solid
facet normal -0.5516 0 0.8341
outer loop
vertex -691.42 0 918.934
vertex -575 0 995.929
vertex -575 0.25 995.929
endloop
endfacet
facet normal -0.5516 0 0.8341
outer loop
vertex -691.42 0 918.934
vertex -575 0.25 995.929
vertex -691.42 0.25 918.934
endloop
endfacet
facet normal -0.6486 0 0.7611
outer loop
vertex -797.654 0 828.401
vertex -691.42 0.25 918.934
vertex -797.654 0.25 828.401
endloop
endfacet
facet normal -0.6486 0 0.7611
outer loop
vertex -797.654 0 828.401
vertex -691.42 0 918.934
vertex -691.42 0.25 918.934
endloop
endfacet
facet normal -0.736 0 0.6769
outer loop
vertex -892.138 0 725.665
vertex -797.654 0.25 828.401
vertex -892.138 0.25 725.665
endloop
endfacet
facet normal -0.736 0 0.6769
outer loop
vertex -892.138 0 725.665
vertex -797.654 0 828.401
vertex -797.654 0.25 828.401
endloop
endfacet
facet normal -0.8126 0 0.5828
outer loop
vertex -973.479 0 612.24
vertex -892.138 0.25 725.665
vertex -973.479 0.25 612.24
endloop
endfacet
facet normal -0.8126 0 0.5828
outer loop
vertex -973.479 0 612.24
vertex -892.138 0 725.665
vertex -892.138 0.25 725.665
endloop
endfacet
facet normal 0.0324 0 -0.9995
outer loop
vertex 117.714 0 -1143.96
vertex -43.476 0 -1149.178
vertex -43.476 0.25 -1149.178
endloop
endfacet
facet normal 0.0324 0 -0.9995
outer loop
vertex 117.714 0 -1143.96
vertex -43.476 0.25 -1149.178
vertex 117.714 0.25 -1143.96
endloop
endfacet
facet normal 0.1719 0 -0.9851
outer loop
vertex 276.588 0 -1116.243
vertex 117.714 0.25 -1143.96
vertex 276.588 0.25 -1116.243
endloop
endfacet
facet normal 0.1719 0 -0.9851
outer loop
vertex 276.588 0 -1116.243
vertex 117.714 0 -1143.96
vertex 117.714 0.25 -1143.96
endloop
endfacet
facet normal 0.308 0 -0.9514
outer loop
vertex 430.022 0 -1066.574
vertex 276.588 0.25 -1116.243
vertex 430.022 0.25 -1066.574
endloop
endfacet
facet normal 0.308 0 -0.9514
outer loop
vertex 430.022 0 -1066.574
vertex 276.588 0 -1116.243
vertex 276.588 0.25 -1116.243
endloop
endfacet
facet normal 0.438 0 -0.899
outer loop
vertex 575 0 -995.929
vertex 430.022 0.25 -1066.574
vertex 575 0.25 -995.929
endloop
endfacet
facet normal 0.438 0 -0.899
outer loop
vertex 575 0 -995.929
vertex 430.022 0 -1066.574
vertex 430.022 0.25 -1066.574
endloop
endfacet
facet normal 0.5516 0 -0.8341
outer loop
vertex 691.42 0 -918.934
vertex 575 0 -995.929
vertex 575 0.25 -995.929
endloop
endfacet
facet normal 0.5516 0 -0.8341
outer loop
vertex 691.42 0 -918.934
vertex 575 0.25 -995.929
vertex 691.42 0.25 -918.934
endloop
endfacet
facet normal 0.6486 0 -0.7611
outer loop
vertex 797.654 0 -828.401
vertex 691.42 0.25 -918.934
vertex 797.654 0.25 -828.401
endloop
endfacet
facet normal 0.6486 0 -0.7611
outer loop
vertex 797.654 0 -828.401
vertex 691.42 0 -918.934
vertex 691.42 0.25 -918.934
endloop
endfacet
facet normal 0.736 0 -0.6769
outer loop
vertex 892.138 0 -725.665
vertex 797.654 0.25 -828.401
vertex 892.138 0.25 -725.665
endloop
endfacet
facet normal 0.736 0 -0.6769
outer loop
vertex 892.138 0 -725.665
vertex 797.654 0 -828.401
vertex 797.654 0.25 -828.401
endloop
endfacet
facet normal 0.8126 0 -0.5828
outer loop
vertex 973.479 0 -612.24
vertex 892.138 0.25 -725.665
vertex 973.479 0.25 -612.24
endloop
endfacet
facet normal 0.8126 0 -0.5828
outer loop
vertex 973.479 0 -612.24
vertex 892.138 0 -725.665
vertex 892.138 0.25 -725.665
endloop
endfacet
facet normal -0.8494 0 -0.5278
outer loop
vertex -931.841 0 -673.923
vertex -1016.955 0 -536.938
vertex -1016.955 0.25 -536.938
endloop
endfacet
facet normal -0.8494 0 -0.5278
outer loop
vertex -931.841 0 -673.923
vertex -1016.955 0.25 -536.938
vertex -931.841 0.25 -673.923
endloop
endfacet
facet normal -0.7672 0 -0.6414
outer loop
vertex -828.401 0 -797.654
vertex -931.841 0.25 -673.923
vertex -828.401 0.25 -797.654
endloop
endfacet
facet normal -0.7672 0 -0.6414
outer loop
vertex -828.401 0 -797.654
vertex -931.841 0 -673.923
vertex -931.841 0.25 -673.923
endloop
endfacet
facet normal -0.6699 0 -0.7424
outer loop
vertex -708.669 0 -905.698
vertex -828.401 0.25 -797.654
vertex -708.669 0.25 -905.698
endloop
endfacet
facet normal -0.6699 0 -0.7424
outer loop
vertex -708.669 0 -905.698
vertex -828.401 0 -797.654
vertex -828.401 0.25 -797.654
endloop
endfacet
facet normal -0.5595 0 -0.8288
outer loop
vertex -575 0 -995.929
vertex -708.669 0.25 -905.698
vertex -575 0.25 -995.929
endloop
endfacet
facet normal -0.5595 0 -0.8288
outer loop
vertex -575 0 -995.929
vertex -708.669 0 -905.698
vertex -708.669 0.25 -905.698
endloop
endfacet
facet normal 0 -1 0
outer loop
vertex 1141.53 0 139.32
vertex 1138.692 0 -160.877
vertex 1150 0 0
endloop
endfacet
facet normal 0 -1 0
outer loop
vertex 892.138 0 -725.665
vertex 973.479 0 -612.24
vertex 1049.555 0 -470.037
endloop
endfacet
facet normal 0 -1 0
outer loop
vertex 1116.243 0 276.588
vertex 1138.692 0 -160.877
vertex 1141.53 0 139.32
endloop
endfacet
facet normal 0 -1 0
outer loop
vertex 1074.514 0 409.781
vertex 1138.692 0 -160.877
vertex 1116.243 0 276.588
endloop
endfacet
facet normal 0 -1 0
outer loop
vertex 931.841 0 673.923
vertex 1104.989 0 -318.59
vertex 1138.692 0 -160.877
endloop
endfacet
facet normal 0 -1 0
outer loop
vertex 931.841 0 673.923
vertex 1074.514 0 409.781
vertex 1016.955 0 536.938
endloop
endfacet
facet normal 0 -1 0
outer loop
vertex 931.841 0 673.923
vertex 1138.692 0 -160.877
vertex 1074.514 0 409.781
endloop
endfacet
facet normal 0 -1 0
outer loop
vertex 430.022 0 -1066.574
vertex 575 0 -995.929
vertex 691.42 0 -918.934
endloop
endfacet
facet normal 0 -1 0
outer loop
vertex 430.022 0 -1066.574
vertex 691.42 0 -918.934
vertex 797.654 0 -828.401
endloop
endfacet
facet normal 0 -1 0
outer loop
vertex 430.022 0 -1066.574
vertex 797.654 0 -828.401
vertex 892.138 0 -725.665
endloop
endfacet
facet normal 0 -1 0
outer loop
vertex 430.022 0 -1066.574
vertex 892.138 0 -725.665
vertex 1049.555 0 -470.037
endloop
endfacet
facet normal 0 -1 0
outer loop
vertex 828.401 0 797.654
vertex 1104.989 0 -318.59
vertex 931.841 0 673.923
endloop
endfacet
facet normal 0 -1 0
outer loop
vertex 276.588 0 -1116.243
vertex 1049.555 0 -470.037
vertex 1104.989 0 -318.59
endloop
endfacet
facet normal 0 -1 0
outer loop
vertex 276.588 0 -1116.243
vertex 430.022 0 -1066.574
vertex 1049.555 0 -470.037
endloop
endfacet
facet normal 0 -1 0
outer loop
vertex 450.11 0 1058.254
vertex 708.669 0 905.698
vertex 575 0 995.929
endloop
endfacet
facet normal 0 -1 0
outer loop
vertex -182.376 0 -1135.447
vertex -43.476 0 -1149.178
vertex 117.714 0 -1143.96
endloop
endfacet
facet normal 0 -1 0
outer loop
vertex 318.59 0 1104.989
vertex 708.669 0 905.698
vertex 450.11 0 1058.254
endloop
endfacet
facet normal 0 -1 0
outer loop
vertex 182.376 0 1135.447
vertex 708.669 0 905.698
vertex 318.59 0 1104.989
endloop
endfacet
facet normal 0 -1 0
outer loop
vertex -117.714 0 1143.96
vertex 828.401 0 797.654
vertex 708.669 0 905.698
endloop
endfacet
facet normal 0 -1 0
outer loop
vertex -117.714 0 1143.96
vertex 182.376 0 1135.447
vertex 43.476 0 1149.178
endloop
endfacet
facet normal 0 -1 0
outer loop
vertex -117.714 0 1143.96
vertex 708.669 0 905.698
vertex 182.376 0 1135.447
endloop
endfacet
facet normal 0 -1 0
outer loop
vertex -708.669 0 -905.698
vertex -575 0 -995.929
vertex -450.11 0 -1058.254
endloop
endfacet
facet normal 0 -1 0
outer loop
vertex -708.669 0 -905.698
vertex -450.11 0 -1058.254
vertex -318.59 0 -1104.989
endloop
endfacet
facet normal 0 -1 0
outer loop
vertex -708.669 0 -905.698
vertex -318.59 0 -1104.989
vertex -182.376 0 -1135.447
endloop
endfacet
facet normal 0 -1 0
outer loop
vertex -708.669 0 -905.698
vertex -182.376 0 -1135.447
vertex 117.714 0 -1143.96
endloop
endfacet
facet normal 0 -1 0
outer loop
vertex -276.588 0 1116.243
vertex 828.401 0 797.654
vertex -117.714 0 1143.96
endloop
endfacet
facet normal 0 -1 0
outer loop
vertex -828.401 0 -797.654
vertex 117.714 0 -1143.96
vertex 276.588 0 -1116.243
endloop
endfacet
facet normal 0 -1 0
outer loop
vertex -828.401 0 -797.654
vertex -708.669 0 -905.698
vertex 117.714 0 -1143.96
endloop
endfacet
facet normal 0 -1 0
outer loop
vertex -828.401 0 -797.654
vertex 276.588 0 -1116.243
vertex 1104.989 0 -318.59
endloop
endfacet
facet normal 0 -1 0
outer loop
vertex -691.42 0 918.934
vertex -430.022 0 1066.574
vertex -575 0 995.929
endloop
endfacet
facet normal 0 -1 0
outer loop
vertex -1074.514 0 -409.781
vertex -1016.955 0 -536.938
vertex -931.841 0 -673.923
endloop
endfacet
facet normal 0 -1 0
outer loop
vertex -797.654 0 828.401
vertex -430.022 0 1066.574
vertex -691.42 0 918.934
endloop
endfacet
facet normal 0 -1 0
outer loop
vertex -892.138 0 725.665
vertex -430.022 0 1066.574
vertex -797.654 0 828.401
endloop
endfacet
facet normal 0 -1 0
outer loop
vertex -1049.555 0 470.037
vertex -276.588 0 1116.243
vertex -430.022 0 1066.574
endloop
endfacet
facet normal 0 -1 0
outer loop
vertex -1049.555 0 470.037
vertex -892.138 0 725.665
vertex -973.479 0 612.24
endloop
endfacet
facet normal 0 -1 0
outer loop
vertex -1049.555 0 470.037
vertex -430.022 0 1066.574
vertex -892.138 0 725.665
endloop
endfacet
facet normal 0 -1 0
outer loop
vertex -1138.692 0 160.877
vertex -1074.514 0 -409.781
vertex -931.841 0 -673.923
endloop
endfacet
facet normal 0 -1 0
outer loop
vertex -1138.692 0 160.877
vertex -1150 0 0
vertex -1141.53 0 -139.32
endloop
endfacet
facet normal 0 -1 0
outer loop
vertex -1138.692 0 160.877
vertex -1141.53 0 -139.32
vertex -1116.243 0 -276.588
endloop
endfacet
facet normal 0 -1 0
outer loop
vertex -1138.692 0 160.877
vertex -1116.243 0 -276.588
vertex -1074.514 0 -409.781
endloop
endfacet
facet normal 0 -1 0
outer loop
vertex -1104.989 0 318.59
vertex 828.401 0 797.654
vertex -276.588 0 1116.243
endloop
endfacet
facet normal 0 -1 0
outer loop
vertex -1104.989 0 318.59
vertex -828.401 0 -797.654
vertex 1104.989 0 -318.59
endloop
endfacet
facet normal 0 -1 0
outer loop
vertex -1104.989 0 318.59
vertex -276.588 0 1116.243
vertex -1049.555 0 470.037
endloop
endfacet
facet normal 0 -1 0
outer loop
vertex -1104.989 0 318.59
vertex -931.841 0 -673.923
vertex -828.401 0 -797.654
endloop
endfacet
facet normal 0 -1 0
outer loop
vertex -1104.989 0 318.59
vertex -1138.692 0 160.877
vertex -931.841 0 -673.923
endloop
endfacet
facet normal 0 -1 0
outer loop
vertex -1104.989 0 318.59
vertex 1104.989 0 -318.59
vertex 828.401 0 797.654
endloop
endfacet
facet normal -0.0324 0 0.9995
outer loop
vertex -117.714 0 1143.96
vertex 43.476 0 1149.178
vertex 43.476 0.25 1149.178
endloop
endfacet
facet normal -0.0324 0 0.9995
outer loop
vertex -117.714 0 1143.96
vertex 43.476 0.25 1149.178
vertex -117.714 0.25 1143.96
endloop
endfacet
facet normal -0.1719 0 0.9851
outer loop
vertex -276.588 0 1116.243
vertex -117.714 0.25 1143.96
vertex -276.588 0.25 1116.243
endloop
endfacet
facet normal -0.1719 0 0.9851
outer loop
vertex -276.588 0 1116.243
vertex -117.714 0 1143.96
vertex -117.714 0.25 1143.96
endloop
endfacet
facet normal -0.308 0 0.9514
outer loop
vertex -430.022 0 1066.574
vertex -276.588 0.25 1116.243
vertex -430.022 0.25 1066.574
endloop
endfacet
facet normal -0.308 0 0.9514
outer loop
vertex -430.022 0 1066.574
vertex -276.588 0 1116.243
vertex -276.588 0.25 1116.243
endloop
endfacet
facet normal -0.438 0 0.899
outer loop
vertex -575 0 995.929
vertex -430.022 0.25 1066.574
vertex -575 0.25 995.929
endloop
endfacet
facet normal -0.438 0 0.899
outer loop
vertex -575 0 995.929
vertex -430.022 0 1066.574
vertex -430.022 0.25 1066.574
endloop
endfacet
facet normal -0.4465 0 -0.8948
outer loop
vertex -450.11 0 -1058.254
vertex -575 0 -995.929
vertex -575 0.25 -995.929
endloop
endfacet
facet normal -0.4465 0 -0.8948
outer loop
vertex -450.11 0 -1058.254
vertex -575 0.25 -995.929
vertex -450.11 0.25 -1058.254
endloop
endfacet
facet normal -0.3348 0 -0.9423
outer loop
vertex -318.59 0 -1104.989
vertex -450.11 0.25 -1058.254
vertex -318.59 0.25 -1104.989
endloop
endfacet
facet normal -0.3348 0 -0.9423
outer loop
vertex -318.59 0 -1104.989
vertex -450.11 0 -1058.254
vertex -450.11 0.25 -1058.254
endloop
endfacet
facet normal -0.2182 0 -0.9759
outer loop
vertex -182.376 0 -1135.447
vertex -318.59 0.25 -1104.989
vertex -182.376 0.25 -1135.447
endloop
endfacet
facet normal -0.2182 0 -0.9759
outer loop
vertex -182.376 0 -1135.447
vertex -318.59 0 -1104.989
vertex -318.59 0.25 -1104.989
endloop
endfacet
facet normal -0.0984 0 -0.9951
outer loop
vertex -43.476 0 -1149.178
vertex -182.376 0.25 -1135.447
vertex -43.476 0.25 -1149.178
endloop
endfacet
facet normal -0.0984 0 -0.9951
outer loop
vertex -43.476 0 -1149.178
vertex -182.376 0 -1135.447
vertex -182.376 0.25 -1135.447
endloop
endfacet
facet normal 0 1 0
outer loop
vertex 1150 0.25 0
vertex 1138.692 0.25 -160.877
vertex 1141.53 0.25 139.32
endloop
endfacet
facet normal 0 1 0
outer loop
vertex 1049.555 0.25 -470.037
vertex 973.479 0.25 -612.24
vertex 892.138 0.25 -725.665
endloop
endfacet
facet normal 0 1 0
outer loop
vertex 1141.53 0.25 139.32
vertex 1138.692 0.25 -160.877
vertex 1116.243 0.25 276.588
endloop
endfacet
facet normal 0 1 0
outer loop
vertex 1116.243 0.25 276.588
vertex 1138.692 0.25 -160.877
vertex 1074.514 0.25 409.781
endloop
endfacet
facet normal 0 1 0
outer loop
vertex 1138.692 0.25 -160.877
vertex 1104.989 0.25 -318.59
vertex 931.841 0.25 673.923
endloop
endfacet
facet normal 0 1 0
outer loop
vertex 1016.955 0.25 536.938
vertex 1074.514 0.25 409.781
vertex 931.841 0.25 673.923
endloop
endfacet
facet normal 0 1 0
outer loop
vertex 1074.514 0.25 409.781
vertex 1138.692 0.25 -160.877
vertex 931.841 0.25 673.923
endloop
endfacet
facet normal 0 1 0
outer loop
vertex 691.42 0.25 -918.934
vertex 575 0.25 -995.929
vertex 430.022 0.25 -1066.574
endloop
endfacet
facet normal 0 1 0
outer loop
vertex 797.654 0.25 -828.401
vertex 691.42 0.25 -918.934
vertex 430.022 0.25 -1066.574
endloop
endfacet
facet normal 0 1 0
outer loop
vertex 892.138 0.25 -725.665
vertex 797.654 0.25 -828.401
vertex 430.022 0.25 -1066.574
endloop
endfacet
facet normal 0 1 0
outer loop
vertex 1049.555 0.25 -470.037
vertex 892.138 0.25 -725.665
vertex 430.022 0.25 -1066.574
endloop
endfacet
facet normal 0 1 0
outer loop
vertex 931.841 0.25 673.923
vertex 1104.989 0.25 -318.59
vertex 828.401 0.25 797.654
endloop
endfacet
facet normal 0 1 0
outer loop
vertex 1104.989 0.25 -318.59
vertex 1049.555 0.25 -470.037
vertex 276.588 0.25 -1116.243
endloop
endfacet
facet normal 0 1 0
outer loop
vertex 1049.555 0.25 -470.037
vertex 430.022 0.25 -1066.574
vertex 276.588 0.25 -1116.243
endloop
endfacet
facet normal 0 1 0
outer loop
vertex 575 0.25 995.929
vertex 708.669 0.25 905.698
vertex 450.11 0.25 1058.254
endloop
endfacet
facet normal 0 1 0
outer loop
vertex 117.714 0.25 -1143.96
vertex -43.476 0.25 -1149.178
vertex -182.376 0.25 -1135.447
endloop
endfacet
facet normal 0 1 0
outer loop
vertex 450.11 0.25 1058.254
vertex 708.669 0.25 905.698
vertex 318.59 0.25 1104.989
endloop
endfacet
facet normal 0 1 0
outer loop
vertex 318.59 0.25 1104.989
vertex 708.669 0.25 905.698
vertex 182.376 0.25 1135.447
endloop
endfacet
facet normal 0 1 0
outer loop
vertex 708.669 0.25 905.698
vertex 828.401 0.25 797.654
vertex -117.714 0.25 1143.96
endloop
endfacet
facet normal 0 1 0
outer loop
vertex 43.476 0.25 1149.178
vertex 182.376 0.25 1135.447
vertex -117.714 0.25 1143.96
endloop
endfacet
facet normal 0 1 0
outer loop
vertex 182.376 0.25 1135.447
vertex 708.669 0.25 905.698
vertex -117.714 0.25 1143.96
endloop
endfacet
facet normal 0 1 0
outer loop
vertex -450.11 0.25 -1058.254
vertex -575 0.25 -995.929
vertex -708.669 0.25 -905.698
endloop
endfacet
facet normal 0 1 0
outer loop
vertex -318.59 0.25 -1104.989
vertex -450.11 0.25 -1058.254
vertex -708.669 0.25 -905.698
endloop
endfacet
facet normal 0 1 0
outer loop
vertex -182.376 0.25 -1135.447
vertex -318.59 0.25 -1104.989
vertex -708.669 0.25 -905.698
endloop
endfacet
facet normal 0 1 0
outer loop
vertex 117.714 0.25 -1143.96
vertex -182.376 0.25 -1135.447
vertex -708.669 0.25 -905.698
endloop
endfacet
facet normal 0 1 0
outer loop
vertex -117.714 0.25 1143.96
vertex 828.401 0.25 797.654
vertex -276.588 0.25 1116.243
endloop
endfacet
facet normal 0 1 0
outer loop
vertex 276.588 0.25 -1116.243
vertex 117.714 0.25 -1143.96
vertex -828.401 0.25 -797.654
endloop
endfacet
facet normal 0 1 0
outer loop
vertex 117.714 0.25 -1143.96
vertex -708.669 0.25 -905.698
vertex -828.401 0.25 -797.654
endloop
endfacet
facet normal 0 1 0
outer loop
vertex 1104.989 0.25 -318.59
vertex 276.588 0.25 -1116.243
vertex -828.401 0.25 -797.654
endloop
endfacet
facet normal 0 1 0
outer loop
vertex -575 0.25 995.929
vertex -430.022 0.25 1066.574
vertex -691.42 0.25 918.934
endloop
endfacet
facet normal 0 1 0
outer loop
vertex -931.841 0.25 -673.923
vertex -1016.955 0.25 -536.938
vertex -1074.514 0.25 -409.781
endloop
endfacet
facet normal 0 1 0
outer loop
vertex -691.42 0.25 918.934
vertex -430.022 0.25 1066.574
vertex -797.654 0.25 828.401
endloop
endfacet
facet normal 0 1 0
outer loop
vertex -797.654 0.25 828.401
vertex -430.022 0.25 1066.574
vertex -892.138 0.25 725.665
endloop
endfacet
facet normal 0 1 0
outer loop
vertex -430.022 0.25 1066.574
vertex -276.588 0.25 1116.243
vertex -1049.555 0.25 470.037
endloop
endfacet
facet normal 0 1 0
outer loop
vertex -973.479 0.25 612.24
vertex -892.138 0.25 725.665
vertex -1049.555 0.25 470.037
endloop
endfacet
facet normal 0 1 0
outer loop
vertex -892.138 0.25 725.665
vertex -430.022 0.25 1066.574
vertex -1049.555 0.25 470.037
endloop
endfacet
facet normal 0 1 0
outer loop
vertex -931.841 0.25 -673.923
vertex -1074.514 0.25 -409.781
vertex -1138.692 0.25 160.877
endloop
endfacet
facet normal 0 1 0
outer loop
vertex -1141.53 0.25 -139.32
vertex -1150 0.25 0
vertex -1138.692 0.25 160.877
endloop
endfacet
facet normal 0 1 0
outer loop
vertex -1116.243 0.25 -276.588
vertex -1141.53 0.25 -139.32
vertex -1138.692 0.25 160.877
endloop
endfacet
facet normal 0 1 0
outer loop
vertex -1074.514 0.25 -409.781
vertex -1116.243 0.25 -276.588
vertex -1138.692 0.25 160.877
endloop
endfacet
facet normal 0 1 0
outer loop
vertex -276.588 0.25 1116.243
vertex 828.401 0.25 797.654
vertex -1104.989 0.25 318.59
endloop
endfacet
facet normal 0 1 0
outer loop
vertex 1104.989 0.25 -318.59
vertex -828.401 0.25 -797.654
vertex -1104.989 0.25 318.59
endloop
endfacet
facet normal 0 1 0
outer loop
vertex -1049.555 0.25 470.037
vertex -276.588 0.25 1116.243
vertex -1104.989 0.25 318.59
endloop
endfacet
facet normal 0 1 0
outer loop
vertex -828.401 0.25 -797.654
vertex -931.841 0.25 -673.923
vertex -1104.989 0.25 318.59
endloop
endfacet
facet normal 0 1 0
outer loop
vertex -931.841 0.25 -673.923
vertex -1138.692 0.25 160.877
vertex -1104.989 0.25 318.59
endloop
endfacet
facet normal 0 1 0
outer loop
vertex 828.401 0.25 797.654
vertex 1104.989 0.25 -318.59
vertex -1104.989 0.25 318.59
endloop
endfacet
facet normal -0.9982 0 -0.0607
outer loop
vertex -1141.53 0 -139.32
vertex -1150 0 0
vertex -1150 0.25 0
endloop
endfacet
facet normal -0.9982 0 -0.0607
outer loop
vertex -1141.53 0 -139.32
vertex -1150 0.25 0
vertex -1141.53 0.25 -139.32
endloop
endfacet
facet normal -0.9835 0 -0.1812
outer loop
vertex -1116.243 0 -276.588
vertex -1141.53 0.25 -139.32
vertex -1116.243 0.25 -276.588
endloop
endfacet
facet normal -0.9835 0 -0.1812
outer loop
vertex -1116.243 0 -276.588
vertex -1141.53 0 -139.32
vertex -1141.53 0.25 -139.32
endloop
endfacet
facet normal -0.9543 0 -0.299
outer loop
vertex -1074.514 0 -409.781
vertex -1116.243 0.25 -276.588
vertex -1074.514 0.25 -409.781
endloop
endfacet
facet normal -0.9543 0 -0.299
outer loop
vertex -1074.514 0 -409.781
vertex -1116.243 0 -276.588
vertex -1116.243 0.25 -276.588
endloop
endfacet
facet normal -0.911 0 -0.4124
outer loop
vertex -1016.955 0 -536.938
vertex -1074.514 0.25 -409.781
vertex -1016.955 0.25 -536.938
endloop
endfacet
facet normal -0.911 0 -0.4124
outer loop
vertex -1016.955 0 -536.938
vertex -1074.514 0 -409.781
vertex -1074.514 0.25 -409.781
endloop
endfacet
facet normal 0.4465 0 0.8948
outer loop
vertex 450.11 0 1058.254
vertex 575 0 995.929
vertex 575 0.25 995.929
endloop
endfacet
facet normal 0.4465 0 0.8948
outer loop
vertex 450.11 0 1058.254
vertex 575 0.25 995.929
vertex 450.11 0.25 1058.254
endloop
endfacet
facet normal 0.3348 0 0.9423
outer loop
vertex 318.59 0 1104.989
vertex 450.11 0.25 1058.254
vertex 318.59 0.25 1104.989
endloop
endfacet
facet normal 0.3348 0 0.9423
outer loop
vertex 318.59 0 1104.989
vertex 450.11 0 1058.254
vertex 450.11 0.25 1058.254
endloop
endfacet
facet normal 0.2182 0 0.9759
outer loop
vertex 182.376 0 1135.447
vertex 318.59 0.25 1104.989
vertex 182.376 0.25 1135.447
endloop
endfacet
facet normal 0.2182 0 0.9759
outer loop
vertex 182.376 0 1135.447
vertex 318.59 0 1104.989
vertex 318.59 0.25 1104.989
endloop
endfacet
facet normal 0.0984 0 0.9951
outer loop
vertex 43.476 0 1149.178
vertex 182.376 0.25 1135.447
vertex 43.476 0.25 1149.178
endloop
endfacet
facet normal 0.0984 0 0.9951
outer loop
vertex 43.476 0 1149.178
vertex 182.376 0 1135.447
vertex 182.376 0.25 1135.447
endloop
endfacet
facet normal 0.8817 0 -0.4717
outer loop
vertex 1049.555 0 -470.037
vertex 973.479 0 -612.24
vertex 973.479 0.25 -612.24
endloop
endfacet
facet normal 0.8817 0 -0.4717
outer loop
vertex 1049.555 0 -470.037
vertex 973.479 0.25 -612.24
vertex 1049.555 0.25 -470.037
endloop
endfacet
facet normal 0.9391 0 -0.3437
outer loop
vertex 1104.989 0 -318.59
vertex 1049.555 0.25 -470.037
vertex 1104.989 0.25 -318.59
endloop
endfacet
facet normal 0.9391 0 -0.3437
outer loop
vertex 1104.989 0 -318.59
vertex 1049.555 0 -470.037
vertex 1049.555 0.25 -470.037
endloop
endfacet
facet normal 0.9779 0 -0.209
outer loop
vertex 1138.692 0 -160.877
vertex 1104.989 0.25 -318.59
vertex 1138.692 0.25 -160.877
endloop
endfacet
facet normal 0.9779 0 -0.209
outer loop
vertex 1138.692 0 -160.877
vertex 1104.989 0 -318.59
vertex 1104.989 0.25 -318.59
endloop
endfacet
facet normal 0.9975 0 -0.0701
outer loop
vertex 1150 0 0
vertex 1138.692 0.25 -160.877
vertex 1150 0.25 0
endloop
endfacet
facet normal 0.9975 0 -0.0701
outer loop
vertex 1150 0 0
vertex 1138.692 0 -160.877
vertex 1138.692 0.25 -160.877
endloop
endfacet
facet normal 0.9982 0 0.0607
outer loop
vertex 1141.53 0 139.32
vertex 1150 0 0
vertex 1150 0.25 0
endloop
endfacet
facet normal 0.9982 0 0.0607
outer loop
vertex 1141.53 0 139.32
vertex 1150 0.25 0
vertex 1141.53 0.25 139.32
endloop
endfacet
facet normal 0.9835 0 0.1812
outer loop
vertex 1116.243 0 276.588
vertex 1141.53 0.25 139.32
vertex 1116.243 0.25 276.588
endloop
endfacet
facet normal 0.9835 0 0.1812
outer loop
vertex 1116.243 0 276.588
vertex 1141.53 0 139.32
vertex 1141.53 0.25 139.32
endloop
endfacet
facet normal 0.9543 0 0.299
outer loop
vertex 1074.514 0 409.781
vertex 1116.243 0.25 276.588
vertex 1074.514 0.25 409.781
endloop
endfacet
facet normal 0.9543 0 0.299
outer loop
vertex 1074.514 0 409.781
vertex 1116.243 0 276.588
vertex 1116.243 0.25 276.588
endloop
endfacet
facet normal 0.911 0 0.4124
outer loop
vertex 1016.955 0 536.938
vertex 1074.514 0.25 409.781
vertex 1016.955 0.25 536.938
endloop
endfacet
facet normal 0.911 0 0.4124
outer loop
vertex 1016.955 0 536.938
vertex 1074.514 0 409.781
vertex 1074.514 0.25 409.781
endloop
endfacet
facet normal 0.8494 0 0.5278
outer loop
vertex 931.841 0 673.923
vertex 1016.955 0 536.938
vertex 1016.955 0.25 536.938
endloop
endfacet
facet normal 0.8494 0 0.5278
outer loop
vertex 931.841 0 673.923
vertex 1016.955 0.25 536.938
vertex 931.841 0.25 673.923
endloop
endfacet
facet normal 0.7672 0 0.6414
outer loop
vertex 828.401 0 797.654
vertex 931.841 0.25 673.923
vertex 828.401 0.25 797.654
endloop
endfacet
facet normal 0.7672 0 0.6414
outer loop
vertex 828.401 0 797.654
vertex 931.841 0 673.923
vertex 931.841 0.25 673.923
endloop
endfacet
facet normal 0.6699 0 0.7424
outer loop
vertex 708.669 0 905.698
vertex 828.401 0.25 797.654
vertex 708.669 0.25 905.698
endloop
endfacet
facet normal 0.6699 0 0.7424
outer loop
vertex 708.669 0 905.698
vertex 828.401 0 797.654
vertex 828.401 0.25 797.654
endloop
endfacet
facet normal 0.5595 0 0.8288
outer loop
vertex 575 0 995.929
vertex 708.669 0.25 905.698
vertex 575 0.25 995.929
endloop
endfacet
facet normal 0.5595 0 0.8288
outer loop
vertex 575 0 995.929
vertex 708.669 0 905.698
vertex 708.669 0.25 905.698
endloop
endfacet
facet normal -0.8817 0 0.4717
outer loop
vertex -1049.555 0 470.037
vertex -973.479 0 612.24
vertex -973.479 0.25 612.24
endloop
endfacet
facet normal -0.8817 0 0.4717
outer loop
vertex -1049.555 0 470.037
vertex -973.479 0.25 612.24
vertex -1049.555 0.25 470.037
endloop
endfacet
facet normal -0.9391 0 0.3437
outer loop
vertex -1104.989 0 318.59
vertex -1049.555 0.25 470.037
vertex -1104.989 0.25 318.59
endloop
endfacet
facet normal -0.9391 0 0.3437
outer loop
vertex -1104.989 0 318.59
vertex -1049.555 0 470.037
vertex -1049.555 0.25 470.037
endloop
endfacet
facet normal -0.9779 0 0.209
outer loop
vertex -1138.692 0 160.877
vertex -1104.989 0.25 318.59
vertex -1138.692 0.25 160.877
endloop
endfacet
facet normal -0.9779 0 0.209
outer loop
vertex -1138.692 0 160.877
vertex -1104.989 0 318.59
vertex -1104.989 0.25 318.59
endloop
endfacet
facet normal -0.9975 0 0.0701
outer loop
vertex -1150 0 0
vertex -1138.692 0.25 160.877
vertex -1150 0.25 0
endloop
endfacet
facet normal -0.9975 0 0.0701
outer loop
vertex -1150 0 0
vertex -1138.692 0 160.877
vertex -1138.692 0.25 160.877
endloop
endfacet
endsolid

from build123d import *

# Parameters (mm, degrees)
BOSS_EXTRUDE1_DEPTH = 0.25
CIRPATTERN11_COUNT  = 6


with BuildPart() as part:
    # Sketch1 → Boss-Extrude1 (new body)
    with BuildSketch(Plane(origin=(0, 0, 0), x_dir=(1, 0, 0), z_dir=(0, 1, 0))):
        with BuildLine():
            Line((0, 0), (973.479438029, 612.239972343))
            ThreePointArc((973.479438029, 612.239972343), (1104.988994002, 318.589584157), (1150, 0))
            ThreePointArc((1150, 0), (1116.243331787, -276.58782374), (1016.955088276, -536.937937223))
            Line((1016.955088276, -536.937937223), (0, 0))
        make_face()
    boss_extrude1 = extrude(amount=BOSS_EXTRUDE1_DEPTH)

    # CirPattern11: Boss-Extrude1 ×6 about axis
    cirpattern11_axis = Axis((0, 28.800854228, 0), (0, -1, 0))
    for i in range(1, CIRPATTERN11_COUNT):
        add(boss_extrude1.rotate(cirpattern11_axis, i * 360 / CIRPATTERN11_COUNT))


solid = part.part
